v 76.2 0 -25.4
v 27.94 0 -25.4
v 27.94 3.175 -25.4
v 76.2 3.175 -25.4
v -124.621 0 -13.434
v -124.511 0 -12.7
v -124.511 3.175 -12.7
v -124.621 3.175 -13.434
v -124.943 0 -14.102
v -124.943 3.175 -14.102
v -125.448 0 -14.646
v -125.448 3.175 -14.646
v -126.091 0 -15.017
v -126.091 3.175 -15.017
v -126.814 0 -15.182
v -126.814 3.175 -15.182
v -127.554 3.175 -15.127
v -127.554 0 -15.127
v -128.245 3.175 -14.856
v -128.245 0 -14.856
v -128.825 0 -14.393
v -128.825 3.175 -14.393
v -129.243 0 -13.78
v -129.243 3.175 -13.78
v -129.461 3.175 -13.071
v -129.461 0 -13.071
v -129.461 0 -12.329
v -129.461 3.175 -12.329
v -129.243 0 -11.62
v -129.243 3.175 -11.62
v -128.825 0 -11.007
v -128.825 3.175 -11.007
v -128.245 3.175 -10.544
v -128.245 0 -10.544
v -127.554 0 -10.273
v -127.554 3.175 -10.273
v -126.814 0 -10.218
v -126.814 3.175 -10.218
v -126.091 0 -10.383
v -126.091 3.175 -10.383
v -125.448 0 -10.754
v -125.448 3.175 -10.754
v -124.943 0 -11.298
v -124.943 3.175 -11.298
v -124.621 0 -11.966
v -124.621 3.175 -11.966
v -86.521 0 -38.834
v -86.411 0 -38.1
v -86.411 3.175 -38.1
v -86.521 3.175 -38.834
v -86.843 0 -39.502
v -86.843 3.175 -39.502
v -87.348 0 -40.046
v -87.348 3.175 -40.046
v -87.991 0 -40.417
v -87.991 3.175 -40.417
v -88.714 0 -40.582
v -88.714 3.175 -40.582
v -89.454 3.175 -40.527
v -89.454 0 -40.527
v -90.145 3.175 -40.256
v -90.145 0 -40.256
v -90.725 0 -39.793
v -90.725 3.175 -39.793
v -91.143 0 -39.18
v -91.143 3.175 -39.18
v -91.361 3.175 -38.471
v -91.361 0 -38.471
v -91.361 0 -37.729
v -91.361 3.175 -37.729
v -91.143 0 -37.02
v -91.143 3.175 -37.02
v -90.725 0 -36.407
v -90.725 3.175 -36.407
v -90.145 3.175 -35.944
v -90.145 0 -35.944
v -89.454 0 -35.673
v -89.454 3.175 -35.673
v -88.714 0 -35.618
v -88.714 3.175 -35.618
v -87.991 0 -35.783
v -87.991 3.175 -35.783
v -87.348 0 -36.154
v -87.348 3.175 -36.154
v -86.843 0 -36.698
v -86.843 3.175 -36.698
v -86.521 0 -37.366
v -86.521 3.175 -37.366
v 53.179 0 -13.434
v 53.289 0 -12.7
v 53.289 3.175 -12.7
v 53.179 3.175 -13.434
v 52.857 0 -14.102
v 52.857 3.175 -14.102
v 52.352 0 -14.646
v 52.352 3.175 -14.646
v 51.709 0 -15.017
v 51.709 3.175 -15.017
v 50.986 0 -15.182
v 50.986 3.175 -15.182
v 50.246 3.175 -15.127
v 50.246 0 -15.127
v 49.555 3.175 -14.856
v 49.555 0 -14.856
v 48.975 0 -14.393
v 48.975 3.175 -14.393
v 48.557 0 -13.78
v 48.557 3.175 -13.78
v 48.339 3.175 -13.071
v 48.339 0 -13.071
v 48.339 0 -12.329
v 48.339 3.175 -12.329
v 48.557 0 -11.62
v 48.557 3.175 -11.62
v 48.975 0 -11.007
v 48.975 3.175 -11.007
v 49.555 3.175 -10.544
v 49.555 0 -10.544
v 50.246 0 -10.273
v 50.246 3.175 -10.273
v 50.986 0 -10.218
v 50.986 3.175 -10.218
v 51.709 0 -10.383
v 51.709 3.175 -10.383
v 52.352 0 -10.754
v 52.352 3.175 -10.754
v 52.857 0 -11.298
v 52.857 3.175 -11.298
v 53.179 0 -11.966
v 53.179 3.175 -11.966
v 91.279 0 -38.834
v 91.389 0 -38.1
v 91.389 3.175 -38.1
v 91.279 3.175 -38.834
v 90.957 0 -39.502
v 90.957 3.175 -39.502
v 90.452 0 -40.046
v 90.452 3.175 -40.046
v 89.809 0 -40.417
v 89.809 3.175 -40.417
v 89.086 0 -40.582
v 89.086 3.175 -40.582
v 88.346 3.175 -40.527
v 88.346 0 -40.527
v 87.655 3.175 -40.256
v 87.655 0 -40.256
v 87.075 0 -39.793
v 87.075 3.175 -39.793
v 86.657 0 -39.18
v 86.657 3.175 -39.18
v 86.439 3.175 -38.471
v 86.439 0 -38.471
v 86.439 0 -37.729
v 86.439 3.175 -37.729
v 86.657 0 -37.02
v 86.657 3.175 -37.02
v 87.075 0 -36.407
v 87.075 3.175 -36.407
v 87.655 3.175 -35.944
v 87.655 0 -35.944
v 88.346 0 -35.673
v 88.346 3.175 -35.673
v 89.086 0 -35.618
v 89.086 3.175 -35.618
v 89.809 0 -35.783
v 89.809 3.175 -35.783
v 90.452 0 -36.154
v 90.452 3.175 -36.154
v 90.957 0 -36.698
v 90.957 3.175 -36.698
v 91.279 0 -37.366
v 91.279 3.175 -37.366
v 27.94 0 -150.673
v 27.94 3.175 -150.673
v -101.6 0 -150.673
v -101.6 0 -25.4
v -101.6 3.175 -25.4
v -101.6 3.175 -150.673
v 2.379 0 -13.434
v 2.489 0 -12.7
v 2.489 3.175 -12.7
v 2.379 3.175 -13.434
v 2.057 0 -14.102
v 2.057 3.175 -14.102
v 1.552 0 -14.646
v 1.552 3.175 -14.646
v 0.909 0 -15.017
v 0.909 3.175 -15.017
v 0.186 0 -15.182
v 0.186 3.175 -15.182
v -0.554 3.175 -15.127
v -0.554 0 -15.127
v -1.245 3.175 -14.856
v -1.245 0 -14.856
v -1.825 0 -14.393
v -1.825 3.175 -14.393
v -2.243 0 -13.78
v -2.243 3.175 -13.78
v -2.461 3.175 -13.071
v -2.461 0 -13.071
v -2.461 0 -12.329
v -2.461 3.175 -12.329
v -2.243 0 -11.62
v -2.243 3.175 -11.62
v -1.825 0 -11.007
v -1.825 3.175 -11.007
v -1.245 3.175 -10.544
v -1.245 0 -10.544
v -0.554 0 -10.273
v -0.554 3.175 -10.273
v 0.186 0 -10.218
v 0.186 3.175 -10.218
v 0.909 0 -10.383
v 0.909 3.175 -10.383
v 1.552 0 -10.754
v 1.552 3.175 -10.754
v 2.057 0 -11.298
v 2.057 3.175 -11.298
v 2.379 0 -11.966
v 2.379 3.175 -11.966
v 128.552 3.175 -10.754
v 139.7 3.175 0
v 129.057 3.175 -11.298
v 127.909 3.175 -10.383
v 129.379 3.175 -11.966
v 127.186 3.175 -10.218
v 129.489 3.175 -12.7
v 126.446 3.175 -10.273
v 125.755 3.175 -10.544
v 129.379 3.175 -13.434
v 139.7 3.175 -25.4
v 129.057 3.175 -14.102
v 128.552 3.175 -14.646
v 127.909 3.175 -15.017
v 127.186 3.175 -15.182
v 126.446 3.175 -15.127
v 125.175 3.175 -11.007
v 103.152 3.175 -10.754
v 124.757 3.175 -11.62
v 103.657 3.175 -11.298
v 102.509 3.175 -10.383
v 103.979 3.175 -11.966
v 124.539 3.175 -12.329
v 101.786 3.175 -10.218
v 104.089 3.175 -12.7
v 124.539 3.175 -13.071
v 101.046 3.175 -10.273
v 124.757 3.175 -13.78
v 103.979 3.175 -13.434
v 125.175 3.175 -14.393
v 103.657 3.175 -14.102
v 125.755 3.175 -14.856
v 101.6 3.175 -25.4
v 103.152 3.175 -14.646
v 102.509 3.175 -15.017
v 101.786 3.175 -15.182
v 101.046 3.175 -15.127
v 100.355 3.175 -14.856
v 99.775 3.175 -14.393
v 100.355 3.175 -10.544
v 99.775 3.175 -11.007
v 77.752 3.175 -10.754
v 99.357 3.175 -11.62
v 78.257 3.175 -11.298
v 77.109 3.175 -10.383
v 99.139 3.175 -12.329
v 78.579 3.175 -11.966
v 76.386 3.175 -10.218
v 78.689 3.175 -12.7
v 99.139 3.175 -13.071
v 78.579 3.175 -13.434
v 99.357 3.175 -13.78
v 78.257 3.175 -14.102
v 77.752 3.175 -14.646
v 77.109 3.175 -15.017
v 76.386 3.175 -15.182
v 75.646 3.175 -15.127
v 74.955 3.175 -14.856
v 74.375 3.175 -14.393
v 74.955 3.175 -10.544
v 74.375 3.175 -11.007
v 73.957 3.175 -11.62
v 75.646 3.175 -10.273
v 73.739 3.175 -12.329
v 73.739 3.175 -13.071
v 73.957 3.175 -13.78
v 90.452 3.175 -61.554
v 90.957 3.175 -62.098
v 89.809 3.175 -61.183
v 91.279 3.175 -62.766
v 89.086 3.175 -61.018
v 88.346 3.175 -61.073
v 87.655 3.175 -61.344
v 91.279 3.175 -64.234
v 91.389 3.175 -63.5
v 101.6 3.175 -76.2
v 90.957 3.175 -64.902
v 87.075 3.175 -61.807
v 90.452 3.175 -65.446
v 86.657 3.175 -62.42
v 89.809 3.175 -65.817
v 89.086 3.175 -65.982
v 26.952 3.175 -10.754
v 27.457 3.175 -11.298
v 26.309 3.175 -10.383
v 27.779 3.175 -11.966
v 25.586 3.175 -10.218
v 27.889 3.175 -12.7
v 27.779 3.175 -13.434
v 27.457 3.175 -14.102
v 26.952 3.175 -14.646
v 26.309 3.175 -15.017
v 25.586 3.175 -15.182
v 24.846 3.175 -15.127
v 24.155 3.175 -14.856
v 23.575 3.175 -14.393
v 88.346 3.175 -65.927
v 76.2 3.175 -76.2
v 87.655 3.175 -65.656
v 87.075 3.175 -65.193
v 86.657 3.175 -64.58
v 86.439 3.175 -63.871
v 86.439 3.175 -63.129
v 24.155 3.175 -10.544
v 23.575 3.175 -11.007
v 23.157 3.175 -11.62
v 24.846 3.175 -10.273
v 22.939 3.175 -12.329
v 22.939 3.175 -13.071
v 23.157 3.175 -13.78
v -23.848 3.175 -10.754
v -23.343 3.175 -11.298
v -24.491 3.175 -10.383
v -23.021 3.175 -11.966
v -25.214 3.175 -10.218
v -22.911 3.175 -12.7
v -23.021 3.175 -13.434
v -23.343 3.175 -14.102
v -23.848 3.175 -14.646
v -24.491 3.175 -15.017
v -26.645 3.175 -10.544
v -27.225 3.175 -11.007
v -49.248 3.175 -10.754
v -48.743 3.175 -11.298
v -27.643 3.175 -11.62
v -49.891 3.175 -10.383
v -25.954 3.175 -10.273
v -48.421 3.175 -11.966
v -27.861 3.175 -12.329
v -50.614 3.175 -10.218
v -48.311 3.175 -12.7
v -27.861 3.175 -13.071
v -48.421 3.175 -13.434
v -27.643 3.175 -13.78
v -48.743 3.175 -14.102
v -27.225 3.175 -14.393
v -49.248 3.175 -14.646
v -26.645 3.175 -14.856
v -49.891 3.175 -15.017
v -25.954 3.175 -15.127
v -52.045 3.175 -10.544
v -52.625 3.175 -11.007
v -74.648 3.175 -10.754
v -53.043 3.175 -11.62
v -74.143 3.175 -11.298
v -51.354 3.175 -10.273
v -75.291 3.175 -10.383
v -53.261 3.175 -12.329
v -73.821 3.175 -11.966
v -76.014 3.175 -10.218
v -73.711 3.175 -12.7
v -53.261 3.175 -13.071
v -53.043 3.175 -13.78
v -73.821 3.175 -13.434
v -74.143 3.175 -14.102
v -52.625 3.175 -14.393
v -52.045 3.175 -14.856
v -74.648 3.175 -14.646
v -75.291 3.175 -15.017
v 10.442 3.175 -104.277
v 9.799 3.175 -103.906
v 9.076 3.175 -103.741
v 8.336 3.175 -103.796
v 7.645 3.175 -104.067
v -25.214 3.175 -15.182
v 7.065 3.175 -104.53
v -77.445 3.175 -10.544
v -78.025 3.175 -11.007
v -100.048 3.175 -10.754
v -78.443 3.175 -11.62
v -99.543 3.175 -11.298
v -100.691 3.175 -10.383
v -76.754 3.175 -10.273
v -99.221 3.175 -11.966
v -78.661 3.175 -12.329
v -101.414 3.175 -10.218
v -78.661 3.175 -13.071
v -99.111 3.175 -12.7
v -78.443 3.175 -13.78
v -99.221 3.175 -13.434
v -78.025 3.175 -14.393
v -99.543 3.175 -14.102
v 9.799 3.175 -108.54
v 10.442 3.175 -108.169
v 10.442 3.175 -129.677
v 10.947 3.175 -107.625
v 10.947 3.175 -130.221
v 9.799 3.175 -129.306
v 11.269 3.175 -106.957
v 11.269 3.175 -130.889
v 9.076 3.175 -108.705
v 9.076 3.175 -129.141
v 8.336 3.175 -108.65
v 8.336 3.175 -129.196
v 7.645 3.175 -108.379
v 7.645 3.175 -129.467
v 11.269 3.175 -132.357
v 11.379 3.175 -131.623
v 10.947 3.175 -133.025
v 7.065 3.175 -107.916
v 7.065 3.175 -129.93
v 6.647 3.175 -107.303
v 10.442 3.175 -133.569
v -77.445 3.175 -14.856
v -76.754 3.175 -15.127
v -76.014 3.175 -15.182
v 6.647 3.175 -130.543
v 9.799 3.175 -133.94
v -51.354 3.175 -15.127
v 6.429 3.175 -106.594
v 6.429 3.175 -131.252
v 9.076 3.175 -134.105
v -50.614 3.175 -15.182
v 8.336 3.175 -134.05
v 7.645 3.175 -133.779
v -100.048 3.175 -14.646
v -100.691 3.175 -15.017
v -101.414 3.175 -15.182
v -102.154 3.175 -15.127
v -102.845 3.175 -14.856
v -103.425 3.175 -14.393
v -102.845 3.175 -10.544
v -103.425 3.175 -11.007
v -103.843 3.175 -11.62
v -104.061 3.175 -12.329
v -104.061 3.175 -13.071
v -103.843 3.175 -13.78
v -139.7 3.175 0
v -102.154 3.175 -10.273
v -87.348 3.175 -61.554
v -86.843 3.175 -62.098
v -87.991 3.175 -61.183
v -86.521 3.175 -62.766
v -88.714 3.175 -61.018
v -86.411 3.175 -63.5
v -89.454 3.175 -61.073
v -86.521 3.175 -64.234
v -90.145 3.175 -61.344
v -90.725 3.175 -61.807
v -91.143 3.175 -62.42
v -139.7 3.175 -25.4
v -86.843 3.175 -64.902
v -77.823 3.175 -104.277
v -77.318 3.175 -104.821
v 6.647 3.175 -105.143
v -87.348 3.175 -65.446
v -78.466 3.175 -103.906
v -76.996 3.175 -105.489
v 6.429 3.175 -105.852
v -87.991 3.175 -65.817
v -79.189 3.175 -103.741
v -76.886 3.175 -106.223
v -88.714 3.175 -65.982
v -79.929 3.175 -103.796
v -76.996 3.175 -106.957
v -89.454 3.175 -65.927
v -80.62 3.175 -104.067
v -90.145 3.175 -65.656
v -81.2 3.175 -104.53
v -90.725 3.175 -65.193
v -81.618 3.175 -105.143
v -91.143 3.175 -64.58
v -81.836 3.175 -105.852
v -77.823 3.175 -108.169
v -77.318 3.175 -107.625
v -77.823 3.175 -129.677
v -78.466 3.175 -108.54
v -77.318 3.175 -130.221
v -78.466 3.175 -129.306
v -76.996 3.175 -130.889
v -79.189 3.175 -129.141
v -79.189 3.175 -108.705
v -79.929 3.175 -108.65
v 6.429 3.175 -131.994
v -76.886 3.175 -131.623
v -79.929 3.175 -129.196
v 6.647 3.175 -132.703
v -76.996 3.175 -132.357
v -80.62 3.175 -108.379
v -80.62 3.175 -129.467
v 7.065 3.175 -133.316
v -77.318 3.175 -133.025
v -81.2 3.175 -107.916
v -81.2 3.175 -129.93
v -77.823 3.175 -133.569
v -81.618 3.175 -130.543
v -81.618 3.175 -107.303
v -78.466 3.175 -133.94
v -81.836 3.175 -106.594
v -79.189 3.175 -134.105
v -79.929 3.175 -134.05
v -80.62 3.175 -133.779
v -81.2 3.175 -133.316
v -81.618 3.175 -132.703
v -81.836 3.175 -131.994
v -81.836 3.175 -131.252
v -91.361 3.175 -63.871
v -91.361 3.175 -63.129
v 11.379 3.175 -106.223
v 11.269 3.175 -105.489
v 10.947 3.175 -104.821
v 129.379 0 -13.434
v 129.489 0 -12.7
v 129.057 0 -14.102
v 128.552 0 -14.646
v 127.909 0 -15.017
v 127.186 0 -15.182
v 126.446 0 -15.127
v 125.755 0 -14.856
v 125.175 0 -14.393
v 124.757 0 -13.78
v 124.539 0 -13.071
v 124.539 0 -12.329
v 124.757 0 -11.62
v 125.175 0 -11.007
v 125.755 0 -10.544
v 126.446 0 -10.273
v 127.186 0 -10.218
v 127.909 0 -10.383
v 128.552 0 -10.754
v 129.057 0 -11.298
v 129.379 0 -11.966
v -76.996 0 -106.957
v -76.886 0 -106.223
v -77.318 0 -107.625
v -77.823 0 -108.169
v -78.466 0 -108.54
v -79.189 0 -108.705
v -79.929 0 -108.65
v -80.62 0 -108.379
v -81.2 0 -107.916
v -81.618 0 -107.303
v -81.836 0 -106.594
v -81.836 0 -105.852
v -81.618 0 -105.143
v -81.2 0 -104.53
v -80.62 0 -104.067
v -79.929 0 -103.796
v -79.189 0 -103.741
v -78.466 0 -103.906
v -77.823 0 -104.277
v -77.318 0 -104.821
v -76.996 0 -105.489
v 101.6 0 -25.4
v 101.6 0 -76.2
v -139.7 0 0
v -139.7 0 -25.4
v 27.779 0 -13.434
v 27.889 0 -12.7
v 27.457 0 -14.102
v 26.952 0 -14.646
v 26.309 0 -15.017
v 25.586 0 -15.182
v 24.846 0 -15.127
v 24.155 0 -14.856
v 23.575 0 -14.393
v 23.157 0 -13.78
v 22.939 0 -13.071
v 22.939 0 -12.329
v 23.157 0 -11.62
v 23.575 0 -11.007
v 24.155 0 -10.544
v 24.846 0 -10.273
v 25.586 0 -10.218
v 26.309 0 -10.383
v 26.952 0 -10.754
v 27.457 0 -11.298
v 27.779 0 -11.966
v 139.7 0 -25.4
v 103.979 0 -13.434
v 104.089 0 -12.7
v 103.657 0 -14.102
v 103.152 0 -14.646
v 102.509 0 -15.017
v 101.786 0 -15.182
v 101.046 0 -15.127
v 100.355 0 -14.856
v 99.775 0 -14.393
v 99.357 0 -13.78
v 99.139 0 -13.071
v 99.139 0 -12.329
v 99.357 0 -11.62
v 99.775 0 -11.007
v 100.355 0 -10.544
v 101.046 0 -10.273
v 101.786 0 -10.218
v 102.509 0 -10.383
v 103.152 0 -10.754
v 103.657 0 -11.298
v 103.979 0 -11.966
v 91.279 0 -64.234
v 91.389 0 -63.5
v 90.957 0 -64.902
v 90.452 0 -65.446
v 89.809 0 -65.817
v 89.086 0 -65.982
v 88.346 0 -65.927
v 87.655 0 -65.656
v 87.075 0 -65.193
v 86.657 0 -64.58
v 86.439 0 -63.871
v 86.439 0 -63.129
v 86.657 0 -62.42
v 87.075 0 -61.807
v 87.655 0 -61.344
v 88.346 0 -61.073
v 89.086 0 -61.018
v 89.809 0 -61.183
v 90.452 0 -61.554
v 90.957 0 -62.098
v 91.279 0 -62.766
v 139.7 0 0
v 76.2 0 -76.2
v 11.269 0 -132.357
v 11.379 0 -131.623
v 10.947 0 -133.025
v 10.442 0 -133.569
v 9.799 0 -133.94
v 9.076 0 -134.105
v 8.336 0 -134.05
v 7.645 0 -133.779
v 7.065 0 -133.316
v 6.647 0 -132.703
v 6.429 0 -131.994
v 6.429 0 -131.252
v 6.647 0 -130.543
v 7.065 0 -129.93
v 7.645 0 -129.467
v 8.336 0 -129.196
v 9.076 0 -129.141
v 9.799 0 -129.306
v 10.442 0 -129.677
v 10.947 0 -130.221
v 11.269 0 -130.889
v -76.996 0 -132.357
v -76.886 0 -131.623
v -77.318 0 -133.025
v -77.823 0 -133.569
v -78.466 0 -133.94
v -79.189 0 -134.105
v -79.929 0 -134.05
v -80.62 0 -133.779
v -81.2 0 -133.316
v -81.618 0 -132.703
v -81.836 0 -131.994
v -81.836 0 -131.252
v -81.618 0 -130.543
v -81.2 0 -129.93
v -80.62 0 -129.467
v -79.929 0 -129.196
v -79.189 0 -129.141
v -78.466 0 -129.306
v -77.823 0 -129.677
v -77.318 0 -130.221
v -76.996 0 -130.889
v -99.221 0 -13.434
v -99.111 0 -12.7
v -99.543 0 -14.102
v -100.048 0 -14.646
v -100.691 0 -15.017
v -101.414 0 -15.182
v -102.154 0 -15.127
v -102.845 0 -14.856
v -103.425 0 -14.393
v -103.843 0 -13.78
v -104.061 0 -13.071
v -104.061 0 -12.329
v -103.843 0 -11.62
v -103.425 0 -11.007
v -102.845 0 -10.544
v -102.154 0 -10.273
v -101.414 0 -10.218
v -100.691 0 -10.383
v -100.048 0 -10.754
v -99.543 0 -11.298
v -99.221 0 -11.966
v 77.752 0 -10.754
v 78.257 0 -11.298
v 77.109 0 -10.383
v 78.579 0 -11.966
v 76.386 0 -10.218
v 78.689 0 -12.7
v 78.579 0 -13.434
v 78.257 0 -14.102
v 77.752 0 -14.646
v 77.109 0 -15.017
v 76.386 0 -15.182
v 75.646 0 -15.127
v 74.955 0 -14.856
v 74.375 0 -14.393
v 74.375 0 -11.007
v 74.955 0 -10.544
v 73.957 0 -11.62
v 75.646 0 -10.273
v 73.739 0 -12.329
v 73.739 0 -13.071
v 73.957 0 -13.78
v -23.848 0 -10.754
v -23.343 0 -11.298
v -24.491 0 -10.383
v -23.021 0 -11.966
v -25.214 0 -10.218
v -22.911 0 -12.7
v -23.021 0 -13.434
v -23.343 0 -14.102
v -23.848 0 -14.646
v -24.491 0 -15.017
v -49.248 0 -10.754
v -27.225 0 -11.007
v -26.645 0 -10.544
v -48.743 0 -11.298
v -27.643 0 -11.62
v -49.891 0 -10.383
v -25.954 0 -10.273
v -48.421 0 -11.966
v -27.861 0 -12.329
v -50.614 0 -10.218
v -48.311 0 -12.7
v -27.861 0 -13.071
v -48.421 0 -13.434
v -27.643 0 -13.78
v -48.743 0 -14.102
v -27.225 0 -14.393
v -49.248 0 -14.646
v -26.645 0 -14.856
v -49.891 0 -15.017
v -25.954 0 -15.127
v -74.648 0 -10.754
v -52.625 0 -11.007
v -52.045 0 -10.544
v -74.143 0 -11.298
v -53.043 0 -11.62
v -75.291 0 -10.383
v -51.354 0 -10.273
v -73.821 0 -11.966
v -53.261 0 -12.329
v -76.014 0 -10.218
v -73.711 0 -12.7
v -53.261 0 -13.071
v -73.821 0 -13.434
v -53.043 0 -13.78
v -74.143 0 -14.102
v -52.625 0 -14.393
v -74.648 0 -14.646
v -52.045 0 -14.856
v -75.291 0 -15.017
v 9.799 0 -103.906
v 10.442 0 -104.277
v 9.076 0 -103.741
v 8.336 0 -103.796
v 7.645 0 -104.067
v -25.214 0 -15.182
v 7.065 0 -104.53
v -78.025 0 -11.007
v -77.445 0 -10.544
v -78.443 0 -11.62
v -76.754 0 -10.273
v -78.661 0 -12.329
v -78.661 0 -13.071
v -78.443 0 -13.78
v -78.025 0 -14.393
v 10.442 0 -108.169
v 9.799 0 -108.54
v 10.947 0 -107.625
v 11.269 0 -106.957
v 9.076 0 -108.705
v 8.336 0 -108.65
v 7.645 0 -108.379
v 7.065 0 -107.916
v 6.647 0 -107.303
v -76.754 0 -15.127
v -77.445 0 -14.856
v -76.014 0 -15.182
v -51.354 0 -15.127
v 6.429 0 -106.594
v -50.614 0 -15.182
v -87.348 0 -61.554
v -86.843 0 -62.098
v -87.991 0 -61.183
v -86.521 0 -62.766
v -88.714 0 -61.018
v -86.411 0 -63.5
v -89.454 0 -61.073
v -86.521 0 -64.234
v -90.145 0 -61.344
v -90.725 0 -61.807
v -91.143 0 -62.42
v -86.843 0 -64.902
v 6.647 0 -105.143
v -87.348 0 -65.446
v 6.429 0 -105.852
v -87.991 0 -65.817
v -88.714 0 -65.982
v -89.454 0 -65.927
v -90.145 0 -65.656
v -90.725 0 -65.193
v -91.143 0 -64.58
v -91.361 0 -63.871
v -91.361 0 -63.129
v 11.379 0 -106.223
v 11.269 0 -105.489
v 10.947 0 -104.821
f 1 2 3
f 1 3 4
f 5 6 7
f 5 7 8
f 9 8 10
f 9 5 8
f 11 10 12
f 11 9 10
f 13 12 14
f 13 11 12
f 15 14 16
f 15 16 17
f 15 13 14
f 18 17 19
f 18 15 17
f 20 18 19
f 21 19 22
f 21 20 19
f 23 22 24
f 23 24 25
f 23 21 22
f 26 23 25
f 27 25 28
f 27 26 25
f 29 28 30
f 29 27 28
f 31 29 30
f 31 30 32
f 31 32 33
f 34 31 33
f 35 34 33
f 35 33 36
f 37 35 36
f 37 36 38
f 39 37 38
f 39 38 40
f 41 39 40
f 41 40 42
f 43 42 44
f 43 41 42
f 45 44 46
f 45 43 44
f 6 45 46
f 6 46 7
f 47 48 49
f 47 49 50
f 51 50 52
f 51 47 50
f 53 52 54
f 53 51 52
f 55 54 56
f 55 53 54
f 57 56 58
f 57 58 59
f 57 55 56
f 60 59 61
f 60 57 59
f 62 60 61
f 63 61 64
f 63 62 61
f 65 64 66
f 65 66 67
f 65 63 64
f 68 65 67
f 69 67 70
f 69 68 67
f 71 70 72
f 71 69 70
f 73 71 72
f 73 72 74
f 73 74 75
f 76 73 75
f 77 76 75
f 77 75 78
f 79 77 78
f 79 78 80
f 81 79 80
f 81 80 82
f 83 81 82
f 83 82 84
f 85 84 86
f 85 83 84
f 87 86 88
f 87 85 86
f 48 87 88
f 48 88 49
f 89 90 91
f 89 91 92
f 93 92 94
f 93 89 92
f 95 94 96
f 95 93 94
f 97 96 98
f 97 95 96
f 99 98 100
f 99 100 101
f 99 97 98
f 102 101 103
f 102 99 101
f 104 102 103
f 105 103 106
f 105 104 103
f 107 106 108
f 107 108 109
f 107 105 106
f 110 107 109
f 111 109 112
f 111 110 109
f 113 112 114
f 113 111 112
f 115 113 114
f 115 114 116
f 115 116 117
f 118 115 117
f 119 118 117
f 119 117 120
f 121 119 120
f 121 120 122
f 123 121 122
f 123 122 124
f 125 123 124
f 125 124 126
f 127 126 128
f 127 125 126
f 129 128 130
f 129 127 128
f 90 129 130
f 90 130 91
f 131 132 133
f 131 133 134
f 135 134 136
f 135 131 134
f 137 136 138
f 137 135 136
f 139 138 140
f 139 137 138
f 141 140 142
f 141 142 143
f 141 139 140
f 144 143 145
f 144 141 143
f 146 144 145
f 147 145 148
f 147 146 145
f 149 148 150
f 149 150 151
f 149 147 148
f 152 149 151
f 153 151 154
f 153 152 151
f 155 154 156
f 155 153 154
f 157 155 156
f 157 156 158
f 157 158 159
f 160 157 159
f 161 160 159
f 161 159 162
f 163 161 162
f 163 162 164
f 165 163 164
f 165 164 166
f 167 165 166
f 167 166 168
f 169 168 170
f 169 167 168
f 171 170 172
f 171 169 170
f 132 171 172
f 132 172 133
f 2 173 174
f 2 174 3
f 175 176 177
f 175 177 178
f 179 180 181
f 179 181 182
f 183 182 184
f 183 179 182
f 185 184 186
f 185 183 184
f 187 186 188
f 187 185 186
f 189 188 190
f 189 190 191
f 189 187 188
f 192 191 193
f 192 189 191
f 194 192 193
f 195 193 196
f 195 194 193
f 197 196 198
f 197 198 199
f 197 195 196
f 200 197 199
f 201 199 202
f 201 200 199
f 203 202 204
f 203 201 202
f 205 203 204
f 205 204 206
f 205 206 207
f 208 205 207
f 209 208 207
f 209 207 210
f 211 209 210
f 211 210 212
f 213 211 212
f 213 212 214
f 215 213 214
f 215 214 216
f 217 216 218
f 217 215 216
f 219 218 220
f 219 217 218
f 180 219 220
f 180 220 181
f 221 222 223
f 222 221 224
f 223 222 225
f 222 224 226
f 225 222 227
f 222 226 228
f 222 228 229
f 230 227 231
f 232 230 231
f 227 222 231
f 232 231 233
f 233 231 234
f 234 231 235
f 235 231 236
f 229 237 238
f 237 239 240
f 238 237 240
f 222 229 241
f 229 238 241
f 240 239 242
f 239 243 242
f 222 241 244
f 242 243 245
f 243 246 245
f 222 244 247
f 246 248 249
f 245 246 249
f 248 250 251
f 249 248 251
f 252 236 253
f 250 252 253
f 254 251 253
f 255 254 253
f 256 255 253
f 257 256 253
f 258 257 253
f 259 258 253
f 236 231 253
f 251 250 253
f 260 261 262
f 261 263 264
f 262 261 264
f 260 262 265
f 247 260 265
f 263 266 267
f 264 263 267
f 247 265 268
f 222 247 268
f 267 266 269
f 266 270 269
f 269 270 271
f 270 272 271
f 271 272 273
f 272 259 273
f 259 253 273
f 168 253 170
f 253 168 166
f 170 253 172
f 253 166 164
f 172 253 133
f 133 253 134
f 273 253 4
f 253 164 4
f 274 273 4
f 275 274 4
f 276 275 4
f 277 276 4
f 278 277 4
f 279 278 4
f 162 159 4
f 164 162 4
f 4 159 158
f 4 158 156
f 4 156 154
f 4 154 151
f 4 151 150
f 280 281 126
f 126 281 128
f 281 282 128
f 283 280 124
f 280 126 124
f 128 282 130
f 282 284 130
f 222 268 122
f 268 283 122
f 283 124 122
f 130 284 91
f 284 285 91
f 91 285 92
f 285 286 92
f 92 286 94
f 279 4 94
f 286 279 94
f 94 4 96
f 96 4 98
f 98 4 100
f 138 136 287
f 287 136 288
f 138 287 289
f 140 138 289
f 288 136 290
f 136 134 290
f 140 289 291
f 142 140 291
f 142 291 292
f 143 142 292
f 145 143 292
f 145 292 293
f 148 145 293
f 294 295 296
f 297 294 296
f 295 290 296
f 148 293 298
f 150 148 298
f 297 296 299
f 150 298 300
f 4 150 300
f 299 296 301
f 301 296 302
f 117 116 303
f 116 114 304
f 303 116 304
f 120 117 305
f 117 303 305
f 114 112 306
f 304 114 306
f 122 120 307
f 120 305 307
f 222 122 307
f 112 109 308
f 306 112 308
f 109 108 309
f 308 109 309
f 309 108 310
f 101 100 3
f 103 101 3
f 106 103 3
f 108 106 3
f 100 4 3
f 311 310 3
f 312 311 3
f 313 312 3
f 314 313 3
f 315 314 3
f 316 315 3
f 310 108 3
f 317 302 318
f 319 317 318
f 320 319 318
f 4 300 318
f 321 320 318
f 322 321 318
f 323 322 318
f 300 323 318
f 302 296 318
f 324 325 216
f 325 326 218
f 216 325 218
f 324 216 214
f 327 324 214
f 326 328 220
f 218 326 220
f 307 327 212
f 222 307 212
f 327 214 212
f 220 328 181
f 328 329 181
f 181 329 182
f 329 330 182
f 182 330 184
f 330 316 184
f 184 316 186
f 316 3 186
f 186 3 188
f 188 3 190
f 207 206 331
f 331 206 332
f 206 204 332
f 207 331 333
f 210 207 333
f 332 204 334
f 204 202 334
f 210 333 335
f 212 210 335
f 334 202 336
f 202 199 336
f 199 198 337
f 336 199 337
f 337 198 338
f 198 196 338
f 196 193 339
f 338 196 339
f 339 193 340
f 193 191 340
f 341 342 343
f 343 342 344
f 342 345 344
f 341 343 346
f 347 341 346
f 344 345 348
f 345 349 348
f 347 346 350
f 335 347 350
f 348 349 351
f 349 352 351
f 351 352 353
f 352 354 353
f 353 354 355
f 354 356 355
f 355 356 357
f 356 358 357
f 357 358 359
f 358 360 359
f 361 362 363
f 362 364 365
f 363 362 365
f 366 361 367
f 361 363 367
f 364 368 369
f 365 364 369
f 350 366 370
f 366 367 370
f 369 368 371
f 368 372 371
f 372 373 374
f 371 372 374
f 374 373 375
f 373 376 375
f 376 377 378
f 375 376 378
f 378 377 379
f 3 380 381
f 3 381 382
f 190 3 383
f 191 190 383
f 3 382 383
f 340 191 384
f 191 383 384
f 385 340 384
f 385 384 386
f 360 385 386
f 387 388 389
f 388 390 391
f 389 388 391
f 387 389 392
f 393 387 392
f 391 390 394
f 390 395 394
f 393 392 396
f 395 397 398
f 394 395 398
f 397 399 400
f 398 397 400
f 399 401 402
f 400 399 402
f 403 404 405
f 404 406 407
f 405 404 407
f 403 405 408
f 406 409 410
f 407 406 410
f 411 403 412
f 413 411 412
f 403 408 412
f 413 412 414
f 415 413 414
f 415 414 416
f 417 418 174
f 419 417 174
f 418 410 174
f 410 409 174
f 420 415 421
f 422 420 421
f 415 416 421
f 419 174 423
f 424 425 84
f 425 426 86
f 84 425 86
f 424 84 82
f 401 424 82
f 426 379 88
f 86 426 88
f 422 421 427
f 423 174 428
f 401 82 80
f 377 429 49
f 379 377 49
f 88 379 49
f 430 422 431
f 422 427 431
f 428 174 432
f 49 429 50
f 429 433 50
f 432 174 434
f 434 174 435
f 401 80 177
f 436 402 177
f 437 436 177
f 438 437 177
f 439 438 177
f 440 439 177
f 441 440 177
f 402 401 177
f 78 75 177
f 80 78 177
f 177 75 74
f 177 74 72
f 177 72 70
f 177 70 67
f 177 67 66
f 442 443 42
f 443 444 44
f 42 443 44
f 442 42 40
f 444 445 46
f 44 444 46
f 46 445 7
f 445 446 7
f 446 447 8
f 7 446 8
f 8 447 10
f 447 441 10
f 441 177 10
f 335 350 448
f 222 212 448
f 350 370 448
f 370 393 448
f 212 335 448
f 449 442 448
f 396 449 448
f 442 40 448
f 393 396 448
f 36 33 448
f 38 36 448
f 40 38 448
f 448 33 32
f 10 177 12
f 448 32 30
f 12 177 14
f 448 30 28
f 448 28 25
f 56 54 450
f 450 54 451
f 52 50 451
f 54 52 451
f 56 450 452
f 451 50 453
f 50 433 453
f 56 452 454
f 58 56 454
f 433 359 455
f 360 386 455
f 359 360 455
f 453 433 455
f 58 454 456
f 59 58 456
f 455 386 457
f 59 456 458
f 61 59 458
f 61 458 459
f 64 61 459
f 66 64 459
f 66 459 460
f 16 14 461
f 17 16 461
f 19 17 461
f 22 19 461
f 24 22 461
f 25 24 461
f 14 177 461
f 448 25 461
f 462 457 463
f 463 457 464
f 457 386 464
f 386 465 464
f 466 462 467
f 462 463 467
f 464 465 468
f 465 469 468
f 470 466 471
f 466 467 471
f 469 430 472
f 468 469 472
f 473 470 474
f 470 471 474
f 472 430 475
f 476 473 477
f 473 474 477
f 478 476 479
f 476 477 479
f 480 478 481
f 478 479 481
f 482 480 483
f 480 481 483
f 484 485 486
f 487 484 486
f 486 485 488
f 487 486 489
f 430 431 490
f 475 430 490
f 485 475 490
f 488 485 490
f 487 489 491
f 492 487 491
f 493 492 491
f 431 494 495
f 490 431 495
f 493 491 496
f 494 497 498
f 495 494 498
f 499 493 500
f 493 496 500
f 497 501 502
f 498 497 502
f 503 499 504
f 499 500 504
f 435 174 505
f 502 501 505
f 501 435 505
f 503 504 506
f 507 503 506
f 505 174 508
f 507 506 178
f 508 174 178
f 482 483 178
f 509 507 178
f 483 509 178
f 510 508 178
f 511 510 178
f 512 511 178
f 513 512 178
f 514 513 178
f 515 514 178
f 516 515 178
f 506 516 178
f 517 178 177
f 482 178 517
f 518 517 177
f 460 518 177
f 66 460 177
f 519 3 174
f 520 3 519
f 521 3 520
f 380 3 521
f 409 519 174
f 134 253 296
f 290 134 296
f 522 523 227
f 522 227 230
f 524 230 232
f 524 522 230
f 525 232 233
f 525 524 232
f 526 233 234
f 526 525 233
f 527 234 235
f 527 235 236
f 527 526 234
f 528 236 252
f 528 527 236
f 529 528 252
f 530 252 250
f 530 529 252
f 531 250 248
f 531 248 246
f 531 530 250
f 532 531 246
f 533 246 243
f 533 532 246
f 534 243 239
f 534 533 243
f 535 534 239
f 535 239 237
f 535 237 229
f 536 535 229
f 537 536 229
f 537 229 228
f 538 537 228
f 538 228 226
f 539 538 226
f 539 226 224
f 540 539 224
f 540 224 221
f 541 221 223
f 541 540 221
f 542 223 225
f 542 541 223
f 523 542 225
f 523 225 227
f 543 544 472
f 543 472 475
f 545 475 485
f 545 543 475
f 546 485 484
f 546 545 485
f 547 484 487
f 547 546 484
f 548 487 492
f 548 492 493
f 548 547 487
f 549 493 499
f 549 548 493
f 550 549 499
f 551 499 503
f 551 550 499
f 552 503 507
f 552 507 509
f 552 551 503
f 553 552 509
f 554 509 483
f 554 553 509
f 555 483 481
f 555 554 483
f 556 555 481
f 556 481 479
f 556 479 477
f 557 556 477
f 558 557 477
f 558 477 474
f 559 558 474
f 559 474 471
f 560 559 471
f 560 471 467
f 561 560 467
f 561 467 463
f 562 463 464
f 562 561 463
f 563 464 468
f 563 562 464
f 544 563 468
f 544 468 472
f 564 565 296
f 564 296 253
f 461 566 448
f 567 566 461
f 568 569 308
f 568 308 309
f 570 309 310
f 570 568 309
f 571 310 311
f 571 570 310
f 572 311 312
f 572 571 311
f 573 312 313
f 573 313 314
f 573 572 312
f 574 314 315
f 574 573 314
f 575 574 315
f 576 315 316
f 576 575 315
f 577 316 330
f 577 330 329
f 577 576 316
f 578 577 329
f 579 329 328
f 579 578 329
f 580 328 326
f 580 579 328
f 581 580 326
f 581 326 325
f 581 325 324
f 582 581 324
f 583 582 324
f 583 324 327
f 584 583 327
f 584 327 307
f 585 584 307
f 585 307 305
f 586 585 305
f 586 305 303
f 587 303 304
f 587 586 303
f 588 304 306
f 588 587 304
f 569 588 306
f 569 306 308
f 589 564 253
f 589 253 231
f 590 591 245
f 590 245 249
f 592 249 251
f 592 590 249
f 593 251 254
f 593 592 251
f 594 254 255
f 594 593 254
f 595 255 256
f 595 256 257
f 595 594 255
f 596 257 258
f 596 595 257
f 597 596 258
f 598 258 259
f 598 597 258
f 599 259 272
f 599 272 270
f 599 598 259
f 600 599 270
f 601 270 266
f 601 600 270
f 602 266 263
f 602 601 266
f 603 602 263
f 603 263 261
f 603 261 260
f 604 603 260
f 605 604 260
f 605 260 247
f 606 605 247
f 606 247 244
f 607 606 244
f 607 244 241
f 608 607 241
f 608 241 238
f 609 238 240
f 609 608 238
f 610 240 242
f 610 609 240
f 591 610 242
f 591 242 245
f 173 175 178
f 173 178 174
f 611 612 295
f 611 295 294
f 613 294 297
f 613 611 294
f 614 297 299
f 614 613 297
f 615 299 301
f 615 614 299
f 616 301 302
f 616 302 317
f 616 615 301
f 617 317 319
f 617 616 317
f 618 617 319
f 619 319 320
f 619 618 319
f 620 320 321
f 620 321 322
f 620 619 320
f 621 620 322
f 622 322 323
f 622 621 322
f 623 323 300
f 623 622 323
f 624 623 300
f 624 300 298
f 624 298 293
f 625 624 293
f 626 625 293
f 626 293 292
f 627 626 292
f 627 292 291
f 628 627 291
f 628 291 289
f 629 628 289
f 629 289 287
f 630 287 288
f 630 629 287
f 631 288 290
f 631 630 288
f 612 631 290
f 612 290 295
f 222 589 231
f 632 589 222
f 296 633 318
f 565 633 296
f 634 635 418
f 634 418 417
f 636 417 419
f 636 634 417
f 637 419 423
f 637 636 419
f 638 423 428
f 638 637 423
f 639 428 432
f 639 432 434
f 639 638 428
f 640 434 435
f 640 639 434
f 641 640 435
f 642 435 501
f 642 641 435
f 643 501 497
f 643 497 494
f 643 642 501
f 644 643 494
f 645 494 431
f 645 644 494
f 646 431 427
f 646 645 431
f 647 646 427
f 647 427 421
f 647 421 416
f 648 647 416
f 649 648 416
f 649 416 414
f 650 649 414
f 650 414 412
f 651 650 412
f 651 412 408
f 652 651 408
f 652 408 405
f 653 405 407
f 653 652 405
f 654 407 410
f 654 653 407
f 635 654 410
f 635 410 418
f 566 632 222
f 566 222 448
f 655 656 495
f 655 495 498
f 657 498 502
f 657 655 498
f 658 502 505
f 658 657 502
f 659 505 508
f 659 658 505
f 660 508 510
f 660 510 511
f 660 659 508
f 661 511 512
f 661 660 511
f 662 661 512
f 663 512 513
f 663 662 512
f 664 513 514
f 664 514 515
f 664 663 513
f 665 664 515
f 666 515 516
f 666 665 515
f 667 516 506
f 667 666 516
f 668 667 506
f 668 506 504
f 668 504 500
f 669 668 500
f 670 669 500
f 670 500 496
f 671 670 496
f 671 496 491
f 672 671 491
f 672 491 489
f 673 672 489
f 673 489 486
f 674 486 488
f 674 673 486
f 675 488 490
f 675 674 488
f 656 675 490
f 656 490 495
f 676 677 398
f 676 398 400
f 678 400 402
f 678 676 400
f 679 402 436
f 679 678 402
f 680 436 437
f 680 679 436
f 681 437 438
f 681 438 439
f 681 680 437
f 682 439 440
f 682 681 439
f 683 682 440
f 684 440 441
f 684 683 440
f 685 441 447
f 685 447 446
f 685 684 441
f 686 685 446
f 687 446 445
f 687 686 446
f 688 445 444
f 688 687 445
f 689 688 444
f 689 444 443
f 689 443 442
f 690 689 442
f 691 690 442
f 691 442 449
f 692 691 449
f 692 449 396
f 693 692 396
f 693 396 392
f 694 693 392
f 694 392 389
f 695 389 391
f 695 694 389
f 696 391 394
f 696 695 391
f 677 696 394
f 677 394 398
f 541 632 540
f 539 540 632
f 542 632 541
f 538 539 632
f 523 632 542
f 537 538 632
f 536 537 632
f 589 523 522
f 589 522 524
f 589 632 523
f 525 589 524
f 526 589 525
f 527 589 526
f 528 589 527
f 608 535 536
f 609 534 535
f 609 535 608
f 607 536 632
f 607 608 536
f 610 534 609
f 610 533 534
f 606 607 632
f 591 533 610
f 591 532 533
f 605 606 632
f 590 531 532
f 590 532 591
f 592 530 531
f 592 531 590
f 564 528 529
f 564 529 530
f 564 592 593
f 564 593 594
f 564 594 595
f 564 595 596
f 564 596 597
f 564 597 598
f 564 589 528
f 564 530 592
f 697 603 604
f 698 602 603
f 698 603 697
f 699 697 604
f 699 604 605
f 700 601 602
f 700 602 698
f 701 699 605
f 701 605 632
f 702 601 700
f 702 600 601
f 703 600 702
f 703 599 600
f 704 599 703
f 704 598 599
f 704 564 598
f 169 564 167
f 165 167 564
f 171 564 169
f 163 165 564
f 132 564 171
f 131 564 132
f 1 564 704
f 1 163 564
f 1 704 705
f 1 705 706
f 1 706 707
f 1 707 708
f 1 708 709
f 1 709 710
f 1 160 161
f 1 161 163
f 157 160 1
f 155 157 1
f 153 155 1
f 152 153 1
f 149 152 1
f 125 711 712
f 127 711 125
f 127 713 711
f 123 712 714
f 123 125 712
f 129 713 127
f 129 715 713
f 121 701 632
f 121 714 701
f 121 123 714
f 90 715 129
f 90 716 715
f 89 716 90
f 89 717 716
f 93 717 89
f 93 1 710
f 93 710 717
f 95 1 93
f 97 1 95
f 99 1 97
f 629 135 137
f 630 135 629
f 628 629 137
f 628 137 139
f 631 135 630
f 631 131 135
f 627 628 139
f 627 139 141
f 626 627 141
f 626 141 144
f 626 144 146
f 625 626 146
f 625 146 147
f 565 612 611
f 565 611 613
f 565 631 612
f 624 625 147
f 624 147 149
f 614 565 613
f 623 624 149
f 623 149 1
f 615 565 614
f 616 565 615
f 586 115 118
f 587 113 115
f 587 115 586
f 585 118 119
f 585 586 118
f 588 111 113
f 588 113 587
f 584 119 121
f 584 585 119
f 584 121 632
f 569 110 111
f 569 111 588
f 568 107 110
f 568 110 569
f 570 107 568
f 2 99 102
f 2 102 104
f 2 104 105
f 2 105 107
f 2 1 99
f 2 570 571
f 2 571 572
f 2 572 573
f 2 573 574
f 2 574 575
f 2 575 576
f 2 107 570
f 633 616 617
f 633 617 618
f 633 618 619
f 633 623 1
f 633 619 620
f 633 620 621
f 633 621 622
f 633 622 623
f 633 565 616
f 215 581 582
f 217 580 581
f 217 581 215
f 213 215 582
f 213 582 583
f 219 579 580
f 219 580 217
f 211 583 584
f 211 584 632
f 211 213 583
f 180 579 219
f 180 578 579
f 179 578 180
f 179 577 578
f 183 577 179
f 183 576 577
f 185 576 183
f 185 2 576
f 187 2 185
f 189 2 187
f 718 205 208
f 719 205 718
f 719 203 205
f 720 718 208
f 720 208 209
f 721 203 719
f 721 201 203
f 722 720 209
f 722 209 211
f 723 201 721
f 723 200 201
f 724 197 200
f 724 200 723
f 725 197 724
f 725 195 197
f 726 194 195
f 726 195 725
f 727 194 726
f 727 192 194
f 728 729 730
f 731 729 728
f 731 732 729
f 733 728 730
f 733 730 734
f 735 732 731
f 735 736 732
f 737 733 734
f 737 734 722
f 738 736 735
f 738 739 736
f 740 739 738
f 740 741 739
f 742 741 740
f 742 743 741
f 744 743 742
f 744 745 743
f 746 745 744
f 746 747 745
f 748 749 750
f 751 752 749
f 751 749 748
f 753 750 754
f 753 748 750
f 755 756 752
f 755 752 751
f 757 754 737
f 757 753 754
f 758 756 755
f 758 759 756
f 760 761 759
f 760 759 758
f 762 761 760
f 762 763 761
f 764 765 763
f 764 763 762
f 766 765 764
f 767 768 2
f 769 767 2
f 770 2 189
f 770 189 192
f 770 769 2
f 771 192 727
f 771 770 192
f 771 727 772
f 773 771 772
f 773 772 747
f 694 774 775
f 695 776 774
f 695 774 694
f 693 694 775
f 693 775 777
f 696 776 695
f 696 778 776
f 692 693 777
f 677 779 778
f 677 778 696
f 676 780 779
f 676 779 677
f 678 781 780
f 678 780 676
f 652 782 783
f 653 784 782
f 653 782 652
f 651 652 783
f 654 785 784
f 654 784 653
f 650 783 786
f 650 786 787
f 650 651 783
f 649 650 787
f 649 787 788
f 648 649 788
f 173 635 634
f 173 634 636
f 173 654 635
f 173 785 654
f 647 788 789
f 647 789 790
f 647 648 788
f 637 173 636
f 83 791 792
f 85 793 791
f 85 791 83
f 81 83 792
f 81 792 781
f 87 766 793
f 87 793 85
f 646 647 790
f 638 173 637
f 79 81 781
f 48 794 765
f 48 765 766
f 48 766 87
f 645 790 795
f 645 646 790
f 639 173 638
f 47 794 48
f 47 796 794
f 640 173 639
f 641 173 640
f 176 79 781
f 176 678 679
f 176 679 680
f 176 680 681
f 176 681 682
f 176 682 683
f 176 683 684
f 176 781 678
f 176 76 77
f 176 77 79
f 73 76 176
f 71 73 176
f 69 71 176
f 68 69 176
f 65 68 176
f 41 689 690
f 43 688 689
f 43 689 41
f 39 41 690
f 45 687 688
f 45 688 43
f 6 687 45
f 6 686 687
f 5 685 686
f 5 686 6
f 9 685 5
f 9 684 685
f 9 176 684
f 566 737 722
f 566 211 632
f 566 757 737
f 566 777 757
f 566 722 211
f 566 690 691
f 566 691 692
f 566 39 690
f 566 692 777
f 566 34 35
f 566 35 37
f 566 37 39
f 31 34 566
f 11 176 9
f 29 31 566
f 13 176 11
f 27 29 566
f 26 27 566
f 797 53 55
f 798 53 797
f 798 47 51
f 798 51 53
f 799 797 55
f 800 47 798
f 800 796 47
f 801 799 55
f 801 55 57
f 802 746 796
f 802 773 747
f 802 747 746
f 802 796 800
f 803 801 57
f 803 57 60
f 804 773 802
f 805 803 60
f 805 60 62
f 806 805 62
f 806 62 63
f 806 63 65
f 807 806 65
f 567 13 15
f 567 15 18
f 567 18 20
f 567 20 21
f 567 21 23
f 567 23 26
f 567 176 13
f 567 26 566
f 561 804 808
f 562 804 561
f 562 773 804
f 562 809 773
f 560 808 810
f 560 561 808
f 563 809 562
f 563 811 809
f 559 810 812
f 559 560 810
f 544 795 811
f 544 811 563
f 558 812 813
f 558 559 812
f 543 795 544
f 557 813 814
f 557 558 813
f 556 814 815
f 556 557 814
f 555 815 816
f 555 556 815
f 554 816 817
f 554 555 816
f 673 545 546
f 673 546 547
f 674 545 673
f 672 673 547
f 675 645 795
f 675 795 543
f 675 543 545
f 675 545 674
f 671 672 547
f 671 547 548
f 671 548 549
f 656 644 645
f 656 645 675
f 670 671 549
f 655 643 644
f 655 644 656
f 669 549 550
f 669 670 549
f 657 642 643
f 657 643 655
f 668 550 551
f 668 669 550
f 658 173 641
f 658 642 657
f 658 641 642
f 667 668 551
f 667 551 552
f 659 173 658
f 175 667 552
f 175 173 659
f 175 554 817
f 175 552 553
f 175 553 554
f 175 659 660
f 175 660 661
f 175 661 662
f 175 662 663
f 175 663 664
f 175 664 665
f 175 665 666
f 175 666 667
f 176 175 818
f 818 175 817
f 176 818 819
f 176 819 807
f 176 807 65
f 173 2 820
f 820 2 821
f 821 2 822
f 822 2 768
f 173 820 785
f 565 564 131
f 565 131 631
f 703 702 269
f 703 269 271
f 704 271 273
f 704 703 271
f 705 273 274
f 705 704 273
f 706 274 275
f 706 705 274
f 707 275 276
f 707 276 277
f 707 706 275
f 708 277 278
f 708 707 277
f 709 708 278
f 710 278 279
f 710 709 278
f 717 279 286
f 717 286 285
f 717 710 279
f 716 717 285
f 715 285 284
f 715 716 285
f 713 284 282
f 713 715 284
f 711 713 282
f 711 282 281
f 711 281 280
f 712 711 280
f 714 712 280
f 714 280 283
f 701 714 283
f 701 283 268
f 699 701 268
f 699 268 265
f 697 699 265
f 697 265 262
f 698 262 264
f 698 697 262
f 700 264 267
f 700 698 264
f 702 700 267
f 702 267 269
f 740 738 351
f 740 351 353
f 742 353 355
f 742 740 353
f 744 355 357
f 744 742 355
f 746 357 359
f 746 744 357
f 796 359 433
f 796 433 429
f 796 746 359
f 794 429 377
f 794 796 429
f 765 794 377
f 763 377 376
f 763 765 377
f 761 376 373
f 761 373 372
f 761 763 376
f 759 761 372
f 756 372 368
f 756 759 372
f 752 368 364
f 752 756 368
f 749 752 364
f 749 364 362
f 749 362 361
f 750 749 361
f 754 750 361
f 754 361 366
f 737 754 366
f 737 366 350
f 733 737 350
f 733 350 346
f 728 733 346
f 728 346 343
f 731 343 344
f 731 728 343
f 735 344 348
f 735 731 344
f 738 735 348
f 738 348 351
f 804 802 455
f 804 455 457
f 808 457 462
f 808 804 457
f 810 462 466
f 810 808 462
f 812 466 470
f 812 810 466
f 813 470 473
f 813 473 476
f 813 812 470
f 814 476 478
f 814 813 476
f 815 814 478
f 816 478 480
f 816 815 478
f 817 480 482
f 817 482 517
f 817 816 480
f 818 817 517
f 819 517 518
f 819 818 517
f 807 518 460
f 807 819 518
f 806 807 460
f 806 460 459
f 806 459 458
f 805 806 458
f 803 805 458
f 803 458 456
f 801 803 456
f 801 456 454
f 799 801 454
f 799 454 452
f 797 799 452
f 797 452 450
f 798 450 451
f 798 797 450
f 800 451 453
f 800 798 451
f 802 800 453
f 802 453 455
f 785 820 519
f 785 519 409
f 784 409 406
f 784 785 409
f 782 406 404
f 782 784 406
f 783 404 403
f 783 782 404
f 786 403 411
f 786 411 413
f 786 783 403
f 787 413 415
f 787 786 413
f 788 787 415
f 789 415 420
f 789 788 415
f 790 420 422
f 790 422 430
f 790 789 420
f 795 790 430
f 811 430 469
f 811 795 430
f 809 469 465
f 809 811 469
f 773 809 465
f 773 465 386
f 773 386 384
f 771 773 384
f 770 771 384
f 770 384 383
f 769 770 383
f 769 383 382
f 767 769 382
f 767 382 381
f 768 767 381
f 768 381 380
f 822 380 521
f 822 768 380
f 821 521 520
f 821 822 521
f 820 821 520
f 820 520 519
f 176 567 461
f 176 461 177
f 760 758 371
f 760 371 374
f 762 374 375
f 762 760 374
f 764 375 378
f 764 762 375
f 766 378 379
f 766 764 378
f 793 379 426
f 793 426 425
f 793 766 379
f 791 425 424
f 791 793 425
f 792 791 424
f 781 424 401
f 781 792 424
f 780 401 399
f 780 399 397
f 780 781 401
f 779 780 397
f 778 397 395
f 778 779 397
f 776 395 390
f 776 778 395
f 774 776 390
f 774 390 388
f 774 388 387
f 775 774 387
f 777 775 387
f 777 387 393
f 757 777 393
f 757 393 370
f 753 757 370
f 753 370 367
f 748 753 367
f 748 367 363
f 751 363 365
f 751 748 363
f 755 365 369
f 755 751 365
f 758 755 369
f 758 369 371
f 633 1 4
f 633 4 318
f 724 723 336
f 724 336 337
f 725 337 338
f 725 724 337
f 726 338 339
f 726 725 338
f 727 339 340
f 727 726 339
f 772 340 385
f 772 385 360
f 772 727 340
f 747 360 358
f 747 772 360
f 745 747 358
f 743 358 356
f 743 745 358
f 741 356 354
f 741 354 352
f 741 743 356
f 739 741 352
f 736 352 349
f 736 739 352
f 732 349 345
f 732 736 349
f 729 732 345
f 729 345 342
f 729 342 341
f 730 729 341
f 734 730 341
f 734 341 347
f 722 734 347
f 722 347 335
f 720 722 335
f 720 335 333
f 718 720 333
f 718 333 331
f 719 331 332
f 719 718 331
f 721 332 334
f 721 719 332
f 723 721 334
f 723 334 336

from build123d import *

# Parameters (mm, degrees)
SKETCH1_R           = 2.4892
BOSS_EXTRUDE1_DEPTH = 3.175


with BuildPart() as part:
    # Sketch1 → Boss-Extrude1 (new body)
    with BuildSketch(Plane(origin=(0, 0, 0), x_dir=(1, 0, 0), z_dir=(0, 1, 0))):
        Polygon((139.7, 0), (-139.7, 0), (-139.7, 25.4), (-101.6, 25.4), (-101.6, 150.6728), (27.94, 150.6728), (27.94, 25.4), (76.2, 25.4), (76.2, 76.2), (101.6, 76.2), (101.6, 25.4), (139.7, 25.4), align=None)
        with Locations((-127, 12.7)):
            Circle(SKETCH1_R, mode=Mode.SUBTRACT)
        with Locations((-88.9, 38.1)):
            Circle(SKETCH1_R, mode=Mode.SUBTRACT)
        with Locations((-88.9, 63.5)):
            Circle(SKETCH1_R, mode=Mode.SUBTRACT)
        with Locations((-79.375, 131.6228)):
            Circle(SKETCH1_R, mode=Mode.SUBTRACT)
        with Locations((-79.375, 106.2228)):
            Circle(SKETCH1_R, mode=Mode.SUBTRACT)
        with Locations((8.89, 106.2228)):
            Circle(SKETCH1_R, mode=Mode.SUBTRACT)
        with Locations((8.89, 131.6228)):
            Circle(SKETCH1_R, mode=Mode.SUBTRACT)
        with Locations((88.9, 63.5)):
            Circle(SKETCH1_R, mode=Mode.SUBTRACT)
        with Locations((88.9, 38.1)):
            Circle(SKETCH1_R, mode=Mode.SUBTRACT)
        with Locations((-101.6, 12.7)):
            Circle(SKETCH1_R, mode=Mode.SUBTRACT)
        with Locations((-76.2, 12.7)):
            Circle(SKETCH1_R, mode=Mode.SUBTRACT)
        with Locations((-50.8, 12.7)):
            Circle(SKETCH1_R, mode=Mode.SUBTRACT)
        with Locations((-25.4, 12.7)):
            Circle(SKETCH1_R, mode=Mode.SUBTRACT)
        with Locations((0, 12.7)):
            Circle(SKETCH1_R, mode=Mode.SUBTRACT)
        with Locations((25.4, 12.7)):
            Circle(SKETCH1_R, mode=Mode.SUBTRACT)
        with Locations((50.8, 12.7)):
            Circle(SKETCH1_R, mode=Mode.SUBTRACT)
        with Locations((76.2, 12.7)):
            Circle(SKETCH1_R, mode=Mode.SUBTRACT)
        with Locations((101.6, 12.7)):
            Circle(SKETCH1_R, mode=Mode.SUBTRACT)
        with Locations((127, 12.7)):
            Circle(SKETCH1_R, mode=Mode.SUBTRACT)
    extrude(amount=BOSS_EXTRUDE1_DEPTH)


solid = part.part
